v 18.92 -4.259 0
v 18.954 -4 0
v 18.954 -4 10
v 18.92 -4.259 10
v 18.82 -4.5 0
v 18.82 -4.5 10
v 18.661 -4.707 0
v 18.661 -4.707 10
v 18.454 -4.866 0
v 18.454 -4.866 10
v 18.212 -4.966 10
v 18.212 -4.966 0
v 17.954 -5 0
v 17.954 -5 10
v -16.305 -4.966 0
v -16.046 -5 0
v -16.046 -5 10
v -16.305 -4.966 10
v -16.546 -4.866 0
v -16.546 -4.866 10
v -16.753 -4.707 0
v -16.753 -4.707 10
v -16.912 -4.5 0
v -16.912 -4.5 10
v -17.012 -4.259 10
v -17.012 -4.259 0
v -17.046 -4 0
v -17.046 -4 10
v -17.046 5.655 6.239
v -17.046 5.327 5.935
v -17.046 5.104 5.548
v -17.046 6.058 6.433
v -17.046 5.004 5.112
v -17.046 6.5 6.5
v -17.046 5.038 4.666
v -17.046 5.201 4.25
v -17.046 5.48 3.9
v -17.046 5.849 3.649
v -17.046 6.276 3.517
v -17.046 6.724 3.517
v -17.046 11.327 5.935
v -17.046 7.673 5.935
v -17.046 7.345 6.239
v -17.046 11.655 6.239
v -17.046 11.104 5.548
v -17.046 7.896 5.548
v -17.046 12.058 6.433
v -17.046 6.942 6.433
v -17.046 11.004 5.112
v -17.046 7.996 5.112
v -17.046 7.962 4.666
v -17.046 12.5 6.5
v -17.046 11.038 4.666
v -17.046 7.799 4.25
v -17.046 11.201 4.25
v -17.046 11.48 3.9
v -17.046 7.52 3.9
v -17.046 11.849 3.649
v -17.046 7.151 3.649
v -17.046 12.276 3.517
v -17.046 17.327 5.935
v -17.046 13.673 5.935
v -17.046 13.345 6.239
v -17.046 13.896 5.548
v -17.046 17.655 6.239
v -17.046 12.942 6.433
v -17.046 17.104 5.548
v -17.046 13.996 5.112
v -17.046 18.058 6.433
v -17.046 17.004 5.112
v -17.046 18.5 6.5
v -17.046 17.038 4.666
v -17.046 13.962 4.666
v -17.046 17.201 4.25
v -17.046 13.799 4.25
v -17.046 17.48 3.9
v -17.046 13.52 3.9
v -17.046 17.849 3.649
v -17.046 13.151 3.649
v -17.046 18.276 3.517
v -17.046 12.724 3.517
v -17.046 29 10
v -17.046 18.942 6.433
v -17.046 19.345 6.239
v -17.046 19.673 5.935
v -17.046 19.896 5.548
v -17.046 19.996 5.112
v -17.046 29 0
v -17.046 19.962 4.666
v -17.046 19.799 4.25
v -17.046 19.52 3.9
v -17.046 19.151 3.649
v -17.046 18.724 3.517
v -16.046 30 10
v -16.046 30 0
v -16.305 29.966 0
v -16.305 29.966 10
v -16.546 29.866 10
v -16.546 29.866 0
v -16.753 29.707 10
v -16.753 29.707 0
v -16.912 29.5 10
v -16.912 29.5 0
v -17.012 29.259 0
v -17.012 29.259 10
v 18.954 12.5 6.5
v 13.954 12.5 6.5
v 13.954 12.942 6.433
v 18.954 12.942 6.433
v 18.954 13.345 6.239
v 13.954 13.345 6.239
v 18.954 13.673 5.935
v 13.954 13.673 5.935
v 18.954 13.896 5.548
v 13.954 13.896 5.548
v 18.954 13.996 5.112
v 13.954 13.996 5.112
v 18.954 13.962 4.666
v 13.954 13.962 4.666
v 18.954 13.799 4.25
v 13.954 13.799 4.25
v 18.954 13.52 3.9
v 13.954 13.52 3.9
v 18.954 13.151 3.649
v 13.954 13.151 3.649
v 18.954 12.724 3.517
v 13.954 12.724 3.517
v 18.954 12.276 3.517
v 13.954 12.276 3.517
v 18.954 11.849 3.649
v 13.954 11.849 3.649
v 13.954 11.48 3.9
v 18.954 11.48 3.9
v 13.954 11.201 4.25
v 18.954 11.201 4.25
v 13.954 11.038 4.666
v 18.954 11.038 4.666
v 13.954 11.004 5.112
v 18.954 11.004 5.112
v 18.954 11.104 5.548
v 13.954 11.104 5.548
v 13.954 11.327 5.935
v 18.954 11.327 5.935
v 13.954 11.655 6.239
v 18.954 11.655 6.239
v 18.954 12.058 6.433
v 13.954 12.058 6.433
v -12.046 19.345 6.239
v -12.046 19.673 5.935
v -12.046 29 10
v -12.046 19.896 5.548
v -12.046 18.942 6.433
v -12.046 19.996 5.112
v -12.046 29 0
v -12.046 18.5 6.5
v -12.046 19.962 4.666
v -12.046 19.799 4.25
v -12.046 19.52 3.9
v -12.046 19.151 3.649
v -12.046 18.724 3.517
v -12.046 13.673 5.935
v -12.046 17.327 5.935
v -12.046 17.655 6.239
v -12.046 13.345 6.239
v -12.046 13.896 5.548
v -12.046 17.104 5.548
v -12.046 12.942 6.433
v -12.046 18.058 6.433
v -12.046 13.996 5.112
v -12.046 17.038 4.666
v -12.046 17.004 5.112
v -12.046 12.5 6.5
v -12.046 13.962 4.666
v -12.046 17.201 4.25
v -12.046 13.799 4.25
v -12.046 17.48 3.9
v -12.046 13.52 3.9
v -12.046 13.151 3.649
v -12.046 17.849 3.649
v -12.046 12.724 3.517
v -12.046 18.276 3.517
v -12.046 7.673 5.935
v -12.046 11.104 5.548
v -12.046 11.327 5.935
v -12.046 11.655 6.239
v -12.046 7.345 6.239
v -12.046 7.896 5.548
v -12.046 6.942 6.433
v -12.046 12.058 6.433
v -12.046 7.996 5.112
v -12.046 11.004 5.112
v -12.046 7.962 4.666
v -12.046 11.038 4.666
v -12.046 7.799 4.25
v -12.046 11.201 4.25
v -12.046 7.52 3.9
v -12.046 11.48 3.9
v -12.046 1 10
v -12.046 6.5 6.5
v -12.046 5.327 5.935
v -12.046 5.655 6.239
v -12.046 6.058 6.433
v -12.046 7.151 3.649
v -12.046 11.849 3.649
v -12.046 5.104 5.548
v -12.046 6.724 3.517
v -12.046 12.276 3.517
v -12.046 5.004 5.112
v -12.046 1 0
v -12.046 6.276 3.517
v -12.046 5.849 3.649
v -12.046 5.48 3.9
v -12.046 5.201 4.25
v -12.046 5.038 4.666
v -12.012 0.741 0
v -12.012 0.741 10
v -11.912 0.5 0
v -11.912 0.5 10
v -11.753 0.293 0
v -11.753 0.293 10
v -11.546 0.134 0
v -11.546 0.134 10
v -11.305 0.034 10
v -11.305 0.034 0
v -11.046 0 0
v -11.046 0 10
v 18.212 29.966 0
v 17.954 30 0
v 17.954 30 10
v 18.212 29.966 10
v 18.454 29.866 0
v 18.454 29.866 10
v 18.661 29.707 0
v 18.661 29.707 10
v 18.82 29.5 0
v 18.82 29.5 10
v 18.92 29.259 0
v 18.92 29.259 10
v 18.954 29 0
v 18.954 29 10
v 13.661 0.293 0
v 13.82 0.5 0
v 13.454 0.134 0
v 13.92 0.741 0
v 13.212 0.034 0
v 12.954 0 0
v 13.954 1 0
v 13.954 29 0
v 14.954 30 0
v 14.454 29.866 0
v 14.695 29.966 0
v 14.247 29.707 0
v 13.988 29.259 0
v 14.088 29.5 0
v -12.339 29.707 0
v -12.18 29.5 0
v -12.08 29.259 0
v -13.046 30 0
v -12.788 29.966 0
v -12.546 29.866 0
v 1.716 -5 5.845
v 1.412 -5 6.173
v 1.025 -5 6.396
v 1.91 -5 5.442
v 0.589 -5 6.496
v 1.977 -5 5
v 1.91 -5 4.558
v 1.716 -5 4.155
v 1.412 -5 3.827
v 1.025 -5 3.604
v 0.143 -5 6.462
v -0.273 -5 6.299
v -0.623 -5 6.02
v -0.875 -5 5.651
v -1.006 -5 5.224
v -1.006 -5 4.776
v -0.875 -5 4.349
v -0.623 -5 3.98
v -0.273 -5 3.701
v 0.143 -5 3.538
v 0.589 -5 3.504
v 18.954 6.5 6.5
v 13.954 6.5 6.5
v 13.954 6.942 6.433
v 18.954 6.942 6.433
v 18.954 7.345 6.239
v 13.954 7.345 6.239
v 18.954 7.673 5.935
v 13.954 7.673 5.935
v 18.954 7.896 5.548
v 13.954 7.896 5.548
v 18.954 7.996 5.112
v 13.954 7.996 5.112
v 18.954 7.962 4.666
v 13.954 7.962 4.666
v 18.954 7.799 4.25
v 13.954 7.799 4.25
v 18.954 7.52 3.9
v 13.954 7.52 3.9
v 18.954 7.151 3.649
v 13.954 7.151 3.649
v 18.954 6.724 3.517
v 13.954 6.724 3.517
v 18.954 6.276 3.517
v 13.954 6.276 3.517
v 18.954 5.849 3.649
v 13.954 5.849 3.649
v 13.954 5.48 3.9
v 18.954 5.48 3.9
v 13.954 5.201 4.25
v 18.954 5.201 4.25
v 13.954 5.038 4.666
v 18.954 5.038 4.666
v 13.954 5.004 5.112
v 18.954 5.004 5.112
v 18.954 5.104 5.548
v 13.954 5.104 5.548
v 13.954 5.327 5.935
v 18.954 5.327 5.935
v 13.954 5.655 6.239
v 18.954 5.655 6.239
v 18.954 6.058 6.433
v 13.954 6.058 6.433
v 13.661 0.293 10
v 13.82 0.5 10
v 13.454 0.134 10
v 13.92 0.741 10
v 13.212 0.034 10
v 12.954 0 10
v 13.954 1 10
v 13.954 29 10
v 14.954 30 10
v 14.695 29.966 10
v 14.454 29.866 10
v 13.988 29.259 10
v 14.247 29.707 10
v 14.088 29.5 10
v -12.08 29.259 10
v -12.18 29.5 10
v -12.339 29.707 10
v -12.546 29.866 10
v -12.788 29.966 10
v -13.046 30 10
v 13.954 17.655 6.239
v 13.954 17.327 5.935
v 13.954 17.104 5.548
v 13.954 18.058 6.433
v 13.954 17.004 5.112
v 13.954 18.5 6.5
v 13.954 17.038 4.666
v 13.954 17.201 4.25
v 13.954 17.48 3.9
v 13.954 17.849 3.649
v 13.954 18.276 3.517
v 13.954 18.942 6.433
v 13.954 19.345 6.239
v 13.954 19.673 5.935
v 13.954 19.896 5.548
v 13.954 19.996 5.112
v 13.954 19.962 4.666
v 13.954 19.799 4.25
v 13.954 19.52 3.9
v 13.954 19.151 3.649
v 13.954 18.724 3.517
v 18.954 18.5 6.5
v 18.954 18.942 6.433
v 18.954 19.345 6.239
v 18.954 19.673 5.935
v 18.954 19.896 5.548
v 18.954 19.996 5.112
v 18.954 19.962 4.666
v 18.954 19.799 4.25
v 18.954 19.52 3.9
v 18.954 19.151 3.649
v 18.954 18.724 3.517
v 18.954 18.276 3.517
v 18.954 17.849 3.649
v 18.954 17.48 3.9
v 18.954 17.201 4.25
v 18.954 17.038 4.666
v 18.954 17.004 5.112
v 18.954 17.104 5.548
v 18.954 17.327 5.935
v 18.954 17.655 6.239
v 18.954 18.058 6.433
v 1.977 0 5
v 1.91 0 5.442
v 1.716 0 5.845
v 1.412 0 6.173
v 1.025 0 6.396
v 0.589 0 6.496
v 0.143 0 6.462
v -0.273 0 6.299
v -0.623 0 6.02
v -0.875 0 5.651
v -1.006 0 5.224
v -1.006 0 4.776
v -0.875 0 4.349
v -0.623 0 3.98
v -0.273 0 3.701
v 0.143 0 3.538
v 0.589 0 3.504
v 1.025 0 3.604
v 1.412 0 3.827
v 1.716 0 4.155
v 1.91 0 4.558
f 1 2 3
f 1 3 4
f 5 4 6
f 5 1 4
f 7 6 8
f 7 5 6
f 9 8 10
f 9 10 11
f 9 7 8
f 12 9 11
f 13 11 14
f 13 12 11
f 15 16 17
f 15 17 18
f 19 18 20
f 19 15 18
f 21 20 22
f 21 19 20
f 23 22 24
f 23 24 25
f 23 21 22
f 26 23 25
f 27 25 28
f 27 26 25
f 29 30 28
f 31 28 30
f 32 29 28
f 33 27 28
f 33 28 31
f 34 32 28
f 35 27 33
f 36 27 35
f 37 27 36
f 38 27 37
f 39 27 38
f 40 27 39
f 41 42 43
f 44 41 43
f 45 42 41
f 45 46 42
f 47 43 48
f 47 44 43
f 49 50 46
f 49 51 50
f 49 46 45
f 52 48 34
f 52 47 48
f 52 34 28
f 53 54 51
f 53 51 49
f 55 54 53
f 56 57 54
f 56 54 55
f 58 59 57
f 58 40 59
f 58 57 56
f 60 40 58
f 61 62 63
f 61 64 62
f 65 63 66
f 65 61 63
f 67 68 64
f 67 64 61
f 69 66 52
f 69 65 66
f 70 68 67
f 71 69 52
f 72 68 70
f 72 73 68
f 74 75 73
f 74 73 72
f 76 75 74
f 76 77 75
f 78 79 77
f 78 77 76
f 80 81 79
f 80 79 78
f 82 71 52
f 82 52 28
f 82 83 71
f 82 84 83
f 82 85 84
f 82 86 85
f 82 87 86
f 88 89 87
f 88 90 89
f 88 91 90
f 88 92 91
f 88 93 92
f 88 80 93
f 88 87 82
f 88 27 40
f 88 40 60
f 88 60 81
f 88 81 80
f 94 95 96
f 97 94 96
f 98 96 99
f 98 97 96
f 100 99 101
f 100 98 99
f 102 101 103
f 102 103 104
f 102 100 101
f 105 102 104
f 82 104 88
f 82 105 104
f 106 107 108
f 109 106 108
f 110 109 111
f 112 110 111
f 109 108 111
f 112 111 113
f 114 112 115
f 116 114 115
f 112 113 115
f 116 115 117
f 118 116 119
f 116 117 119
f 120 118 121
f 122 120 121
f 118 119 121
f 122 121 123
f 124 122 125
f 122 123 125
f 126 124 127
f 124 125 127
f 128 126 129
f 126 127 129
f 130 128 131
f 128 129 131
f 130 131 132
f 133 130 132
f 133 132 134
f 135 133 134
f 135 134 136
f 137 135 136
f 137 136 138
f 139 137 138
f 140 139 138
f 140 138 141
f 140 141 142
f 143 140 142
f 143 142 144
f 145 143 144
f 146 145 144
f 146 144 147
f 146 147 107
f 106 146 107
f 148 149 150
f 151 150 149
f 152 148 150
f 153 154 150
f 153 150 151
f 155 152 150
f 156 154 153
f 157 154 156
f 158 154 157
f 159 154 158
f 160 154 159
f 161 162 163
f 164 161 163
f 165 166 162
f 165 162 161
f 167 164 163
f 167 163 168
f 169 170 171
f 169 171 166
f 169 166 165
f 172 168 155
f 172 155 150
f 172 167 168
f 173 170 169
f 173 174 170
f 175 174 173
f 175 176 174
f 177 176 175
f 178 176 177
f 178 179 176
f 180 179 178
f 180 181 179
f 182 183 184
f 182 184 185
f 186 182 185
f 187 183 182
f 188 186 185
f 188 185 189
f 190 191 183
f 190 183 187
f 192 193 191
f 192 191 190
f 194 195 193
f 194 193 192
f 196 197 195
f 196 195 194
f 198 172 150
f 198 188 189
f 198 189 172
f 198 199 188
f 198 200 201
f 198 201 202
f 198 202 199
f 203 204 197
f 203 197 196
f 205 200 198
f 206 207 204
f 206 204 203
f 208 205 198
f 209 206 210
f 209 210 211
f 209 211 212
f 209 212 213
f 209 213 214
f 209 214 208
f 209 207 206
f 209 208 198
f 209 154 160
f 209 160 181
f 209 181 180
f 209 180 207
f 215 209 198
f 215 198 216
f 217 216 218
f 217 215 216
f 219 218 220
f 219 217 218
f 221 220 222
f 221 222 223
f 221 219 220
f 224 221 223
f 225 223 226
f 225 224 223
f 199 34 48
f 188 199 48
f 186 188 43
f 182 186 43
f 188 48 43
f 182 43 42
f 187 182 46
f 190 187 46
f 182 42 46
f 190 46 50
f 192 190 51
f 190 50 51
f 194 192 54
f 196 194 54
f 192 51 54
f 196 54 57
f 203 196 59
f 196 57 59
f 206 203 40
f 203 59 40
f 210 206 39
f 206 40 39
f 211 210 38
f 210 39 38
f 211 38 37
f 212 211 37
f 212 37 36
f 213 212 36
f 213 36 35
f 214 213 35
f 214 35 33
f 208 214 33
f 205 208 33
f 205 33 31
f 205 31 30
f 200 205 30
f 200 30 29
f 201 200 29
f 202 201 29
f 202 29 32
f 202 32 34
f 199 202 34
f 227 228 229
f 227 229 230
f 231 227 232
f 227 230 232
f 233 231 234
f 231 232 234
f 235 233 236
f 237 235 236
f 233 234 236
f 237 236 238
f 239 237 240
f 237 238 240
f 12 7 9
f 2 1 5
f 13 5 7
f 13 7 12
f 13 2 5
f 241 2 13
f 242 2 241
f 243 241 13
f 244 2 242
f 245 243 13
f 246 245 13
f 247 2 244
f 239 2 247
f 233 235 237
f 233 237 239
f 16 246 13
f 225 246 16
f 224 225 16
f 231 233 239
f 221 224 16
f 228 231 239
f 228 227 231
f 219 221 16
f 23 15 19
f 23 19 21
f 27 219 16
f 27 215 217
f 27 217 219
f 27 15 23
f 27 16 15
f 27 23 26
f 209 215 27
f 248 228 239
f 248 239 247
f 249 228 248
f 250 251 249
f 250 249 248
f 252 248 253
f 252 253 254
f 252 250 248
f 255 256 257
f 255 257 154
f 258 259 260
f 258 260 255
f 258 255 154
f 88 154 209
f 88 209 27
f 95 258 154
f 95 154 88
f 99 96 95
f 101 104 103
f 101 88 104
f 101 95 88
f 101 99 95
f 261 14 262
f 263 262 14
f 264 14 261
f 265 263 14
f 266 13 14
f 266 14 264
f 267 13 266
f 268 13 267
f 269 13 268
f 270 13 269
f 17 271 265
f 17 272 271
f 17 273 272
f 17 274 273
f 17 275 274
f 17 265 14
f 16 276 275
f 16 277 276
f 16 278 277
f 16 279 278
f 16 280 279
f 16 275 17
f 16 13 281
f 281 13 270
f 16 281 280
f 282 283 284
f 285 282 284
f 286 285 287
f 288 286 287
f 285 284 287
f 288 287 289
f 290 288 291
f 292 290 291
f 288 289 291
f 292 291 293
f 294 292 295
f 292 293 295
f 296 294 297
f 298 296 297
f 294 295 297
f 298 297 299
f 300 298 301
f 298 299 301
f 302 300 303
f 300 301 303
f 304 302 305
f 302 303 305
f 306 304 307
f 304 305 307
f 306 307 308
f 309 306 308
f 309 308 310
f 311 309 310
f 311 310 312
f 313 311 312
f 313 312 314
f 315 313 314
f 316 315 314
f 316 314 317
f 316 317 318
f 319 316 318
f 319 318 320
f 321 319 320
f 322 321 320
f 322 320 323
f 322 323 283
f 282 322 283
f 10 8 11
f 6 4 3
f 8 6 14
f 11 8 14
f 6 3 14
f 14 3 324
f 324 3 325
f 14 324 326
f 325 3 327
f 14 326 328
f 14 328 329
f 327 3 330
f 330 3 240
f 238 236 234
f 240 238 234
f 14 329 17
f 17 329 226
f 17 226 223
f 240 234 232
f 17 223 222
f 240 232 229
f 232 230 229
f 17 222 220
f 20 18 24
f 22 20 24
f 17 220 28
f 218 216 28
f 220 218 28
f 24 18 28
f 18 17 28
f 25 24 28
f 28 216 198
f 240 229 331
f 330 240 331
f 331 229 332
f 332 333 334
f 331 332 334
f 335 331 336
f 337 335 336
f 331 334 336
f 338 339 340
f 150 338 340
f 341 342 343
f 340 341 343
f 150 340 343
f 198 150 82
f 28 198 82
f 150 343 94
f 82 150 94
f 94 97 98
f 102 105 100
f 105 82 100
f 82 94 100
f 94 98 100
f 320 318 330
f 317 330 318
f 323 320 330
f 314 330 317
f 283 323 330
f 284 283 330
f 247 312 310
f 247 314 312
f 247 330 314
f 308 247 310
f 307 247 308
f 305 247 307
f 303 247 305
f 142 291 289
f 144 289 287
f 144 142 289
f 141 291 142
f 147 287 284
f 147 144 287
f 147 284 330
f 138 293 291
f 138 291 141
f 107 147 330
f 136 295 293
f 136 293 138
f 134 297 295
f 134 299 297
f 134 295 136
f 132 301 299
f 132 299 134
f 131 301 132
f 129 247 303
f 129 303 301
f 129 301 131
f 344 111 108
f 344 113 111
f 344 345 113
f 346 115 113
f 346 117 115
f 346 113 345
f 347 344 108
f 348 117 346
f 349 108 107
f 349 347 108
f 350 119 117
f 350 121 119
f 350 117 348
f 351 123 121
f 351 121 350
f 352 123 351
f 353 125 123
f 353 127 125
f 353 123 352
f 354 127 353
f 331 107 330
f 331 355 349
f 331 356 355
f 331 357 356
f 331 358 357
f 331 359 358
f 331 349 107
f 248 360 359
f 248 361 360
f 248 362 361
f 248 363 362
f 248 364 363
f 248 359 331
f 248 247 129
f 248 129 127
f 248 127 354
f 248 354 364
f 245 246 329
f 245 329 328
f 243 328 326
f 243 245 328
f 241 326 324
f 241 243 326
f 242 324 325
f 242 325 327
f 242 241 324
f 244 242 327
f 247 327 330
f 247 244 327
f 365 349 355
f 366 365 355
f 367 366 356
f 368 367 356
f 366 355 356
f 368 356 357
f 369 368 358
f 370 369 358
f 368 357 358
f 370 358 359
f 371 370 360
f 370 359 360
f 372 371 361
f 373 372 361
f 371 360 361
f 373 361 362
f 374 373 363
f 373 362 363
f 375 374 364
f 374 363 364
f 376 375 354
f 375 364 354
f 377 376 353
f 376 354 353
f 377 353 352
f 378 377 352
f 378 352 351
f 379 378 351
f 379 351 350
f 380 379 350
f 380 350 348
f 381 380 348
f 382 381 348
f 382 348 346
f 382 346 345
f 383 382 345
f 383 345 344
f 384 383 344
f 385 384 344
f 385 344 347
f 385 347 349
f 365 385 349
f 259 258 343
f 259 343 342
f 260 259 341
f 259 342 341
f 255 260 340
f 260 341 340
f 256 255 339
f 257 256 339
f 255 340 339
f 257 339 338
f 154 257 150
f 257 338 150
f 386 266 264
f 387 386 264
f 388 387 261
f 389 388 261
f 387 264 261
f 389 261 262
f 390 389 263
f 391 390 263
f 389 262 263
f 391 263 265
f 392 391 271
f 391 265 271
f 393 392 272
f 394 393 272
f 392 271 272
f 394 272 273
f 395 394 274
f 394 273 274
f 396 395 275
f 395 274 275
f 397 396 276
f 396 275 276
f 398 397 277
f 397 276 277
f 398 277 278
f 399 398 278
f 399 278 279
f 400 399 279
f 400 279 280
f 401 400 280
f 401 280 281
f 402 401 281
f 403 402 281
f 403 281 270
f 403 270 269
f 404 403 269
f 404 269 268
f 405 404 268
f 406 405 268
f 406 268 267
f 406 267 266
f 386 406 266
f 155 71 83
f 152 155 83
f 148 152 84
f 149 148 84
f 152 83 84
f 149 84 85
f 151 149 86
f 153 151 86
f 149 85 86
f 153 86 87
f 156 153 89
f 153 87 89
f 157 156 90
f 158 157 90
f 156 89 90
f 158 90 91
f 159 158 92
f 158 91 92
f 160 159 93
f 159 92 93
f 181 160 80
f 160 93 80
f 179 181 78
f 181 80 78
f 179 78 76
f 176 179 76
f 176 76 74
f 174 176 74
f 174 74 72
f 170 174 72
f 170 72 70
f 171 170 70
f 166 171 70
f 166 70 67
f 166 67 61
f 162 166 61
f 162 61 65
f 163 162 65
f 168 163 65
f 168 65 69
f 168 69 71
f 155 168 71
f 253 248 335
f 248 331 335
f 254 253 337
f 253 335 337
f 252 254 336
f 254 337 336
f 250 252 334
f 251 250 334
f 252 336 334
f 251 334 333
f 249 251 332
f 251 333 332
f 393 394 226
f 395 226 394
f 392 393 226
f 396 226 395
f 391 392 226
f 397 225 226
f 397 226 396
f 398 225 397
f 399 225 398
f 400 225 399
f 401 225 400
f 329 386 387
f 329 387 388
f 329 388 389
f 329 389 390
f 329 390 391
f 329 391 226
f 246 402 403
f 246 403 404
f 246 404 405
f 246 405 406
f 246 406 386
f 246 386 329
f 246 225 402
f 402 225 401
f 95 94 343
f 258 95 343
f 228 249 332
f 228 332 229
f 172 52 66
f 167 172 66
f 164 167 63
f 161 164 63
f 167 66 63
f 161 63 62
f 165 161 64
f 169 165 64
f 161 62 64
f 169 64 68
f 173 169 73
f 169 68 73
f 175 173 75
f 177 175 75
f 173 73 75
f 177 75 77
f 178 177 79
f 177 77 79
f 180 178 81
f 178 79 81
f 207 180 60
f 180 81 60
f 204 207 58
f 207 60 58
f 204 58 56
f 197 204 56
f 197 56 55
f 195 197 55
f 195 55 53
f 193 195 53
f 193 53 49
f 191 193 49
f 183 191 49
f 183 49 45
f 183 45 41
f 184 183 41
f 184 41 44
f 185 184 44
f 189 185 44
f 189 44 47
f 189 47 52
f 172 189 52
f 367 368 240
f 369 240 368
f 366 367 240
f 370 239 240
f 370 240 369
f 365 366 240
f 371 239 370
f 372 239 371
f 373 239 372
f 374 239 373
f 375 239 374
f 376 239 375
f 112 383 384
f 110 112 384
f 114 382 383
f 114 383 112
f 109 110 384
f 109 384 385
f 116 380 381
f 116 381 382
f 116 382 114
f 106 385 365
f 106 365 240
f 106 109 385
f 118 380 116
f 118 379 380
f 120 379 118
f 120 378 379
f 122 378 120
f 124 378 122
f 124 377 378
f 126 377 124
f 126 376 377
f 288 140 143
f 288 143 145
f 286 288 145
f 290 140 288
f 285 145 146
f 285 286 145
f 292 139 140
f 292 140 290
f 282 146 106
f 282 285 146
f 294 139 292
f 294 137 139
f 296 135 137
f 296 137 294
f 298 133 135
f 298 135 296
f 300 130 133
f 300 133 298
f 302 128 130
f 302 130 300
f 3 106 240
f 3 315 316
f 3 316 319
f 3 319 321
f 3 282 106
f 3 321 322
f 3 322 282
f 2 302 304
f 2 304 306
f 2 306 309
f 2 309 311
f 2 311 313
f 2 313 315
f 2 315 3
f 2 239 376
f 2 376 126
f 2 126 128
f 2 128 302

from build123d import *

# Parameters (mm, degrees)
EXTRUDE_1_DEPTH     = 10
FILLET_1_R          = 1
SKETCH_3_R          = 1.5
CUT_EXTRUDE_2_DEPTH = 6
SKETCH_2_R          = 1.5
CUT_EXTRUDE_3_DEPTH = 48.916594203


with BuildPart() as part:
    # 草图1 → 凸台-拉伸1 (new body)
    with BuildSketch(Plane.XY):
        with BuildLine():
            Line((-17.046320844, 30), (-12.046320844, 30))
            Line((-12.046320844, 30), (-12.046320844, 1))
            ThreePointArc((-12.046320844, 1), (-11.753427625, 0.292893219), (-11.046320844, 0))
            Line((-11.046320844, 0), (12.953679156, 0))
            ThreePointArc((12.953679156, 0), (13.660785937, 0.292893219), (13.953679156, 1))
            Line((13.953679156, 1), (13.953679156, 30))
            Line((13.953679156, 30), (18.953679156, 30))
            Line((18.953679156, 30), (18.953679156, -4))
            ThreePointArc((18.953679156, -4), (18.660785937, -4.707106781), (17.953679156, -5))
            Line((17.953679156, -5), (-16.046320844, -5))
            ThreePointArc((-16.046320844, -5), (-16.753427625, -4.707106781), (-17.046320844, -4))
            Line((-17.046320844, -4), (-17.046320844, 30))
        make_face()
    extrude(amount=EXTRUDE_1_DEPTH)

    # 圆角1
    fillet_1_edges = [part.edges().sort_by_distance(p)[0] for p in [
        (18.953679156, 30, 5),
        (13.953679156, 30, 5),
        (-12.046320844, 30, 5),
        (-17.046320844, 30, 5),
    ]]
    fillet(fillet_1_edges, radius=FILLET_1_R)

    # 草图3 → 切除-拉伸2 (cut)
    with BuildSketch(Plane.XZ.offset(5)):
        with Locations((0.476839578, 5)):
            Circle(SKETCH_3_R)
    extrude(amount=-CUT_EXTRUDE_2_DEPTH, mode=Mode.SUBTRACT)

    # 草图2 → 切除-拉伸3 (cut, through all)
    with BuildSketch(Plane.ZY.offset(17.046320844)):
        with Locations((5, 12.5)):
            Circle(SKETCH_2_R)
        with Locations((5, 6.5)):
            Circle(SKETCH_2_R)
        with Locations((5, 18.5)):
            Circle(SKETCH_2_R)
    extrude(amount=-CUT_EXTRUDE_3_DEPTH, mode=Mode.SUBTRACT)


solid = part.part
